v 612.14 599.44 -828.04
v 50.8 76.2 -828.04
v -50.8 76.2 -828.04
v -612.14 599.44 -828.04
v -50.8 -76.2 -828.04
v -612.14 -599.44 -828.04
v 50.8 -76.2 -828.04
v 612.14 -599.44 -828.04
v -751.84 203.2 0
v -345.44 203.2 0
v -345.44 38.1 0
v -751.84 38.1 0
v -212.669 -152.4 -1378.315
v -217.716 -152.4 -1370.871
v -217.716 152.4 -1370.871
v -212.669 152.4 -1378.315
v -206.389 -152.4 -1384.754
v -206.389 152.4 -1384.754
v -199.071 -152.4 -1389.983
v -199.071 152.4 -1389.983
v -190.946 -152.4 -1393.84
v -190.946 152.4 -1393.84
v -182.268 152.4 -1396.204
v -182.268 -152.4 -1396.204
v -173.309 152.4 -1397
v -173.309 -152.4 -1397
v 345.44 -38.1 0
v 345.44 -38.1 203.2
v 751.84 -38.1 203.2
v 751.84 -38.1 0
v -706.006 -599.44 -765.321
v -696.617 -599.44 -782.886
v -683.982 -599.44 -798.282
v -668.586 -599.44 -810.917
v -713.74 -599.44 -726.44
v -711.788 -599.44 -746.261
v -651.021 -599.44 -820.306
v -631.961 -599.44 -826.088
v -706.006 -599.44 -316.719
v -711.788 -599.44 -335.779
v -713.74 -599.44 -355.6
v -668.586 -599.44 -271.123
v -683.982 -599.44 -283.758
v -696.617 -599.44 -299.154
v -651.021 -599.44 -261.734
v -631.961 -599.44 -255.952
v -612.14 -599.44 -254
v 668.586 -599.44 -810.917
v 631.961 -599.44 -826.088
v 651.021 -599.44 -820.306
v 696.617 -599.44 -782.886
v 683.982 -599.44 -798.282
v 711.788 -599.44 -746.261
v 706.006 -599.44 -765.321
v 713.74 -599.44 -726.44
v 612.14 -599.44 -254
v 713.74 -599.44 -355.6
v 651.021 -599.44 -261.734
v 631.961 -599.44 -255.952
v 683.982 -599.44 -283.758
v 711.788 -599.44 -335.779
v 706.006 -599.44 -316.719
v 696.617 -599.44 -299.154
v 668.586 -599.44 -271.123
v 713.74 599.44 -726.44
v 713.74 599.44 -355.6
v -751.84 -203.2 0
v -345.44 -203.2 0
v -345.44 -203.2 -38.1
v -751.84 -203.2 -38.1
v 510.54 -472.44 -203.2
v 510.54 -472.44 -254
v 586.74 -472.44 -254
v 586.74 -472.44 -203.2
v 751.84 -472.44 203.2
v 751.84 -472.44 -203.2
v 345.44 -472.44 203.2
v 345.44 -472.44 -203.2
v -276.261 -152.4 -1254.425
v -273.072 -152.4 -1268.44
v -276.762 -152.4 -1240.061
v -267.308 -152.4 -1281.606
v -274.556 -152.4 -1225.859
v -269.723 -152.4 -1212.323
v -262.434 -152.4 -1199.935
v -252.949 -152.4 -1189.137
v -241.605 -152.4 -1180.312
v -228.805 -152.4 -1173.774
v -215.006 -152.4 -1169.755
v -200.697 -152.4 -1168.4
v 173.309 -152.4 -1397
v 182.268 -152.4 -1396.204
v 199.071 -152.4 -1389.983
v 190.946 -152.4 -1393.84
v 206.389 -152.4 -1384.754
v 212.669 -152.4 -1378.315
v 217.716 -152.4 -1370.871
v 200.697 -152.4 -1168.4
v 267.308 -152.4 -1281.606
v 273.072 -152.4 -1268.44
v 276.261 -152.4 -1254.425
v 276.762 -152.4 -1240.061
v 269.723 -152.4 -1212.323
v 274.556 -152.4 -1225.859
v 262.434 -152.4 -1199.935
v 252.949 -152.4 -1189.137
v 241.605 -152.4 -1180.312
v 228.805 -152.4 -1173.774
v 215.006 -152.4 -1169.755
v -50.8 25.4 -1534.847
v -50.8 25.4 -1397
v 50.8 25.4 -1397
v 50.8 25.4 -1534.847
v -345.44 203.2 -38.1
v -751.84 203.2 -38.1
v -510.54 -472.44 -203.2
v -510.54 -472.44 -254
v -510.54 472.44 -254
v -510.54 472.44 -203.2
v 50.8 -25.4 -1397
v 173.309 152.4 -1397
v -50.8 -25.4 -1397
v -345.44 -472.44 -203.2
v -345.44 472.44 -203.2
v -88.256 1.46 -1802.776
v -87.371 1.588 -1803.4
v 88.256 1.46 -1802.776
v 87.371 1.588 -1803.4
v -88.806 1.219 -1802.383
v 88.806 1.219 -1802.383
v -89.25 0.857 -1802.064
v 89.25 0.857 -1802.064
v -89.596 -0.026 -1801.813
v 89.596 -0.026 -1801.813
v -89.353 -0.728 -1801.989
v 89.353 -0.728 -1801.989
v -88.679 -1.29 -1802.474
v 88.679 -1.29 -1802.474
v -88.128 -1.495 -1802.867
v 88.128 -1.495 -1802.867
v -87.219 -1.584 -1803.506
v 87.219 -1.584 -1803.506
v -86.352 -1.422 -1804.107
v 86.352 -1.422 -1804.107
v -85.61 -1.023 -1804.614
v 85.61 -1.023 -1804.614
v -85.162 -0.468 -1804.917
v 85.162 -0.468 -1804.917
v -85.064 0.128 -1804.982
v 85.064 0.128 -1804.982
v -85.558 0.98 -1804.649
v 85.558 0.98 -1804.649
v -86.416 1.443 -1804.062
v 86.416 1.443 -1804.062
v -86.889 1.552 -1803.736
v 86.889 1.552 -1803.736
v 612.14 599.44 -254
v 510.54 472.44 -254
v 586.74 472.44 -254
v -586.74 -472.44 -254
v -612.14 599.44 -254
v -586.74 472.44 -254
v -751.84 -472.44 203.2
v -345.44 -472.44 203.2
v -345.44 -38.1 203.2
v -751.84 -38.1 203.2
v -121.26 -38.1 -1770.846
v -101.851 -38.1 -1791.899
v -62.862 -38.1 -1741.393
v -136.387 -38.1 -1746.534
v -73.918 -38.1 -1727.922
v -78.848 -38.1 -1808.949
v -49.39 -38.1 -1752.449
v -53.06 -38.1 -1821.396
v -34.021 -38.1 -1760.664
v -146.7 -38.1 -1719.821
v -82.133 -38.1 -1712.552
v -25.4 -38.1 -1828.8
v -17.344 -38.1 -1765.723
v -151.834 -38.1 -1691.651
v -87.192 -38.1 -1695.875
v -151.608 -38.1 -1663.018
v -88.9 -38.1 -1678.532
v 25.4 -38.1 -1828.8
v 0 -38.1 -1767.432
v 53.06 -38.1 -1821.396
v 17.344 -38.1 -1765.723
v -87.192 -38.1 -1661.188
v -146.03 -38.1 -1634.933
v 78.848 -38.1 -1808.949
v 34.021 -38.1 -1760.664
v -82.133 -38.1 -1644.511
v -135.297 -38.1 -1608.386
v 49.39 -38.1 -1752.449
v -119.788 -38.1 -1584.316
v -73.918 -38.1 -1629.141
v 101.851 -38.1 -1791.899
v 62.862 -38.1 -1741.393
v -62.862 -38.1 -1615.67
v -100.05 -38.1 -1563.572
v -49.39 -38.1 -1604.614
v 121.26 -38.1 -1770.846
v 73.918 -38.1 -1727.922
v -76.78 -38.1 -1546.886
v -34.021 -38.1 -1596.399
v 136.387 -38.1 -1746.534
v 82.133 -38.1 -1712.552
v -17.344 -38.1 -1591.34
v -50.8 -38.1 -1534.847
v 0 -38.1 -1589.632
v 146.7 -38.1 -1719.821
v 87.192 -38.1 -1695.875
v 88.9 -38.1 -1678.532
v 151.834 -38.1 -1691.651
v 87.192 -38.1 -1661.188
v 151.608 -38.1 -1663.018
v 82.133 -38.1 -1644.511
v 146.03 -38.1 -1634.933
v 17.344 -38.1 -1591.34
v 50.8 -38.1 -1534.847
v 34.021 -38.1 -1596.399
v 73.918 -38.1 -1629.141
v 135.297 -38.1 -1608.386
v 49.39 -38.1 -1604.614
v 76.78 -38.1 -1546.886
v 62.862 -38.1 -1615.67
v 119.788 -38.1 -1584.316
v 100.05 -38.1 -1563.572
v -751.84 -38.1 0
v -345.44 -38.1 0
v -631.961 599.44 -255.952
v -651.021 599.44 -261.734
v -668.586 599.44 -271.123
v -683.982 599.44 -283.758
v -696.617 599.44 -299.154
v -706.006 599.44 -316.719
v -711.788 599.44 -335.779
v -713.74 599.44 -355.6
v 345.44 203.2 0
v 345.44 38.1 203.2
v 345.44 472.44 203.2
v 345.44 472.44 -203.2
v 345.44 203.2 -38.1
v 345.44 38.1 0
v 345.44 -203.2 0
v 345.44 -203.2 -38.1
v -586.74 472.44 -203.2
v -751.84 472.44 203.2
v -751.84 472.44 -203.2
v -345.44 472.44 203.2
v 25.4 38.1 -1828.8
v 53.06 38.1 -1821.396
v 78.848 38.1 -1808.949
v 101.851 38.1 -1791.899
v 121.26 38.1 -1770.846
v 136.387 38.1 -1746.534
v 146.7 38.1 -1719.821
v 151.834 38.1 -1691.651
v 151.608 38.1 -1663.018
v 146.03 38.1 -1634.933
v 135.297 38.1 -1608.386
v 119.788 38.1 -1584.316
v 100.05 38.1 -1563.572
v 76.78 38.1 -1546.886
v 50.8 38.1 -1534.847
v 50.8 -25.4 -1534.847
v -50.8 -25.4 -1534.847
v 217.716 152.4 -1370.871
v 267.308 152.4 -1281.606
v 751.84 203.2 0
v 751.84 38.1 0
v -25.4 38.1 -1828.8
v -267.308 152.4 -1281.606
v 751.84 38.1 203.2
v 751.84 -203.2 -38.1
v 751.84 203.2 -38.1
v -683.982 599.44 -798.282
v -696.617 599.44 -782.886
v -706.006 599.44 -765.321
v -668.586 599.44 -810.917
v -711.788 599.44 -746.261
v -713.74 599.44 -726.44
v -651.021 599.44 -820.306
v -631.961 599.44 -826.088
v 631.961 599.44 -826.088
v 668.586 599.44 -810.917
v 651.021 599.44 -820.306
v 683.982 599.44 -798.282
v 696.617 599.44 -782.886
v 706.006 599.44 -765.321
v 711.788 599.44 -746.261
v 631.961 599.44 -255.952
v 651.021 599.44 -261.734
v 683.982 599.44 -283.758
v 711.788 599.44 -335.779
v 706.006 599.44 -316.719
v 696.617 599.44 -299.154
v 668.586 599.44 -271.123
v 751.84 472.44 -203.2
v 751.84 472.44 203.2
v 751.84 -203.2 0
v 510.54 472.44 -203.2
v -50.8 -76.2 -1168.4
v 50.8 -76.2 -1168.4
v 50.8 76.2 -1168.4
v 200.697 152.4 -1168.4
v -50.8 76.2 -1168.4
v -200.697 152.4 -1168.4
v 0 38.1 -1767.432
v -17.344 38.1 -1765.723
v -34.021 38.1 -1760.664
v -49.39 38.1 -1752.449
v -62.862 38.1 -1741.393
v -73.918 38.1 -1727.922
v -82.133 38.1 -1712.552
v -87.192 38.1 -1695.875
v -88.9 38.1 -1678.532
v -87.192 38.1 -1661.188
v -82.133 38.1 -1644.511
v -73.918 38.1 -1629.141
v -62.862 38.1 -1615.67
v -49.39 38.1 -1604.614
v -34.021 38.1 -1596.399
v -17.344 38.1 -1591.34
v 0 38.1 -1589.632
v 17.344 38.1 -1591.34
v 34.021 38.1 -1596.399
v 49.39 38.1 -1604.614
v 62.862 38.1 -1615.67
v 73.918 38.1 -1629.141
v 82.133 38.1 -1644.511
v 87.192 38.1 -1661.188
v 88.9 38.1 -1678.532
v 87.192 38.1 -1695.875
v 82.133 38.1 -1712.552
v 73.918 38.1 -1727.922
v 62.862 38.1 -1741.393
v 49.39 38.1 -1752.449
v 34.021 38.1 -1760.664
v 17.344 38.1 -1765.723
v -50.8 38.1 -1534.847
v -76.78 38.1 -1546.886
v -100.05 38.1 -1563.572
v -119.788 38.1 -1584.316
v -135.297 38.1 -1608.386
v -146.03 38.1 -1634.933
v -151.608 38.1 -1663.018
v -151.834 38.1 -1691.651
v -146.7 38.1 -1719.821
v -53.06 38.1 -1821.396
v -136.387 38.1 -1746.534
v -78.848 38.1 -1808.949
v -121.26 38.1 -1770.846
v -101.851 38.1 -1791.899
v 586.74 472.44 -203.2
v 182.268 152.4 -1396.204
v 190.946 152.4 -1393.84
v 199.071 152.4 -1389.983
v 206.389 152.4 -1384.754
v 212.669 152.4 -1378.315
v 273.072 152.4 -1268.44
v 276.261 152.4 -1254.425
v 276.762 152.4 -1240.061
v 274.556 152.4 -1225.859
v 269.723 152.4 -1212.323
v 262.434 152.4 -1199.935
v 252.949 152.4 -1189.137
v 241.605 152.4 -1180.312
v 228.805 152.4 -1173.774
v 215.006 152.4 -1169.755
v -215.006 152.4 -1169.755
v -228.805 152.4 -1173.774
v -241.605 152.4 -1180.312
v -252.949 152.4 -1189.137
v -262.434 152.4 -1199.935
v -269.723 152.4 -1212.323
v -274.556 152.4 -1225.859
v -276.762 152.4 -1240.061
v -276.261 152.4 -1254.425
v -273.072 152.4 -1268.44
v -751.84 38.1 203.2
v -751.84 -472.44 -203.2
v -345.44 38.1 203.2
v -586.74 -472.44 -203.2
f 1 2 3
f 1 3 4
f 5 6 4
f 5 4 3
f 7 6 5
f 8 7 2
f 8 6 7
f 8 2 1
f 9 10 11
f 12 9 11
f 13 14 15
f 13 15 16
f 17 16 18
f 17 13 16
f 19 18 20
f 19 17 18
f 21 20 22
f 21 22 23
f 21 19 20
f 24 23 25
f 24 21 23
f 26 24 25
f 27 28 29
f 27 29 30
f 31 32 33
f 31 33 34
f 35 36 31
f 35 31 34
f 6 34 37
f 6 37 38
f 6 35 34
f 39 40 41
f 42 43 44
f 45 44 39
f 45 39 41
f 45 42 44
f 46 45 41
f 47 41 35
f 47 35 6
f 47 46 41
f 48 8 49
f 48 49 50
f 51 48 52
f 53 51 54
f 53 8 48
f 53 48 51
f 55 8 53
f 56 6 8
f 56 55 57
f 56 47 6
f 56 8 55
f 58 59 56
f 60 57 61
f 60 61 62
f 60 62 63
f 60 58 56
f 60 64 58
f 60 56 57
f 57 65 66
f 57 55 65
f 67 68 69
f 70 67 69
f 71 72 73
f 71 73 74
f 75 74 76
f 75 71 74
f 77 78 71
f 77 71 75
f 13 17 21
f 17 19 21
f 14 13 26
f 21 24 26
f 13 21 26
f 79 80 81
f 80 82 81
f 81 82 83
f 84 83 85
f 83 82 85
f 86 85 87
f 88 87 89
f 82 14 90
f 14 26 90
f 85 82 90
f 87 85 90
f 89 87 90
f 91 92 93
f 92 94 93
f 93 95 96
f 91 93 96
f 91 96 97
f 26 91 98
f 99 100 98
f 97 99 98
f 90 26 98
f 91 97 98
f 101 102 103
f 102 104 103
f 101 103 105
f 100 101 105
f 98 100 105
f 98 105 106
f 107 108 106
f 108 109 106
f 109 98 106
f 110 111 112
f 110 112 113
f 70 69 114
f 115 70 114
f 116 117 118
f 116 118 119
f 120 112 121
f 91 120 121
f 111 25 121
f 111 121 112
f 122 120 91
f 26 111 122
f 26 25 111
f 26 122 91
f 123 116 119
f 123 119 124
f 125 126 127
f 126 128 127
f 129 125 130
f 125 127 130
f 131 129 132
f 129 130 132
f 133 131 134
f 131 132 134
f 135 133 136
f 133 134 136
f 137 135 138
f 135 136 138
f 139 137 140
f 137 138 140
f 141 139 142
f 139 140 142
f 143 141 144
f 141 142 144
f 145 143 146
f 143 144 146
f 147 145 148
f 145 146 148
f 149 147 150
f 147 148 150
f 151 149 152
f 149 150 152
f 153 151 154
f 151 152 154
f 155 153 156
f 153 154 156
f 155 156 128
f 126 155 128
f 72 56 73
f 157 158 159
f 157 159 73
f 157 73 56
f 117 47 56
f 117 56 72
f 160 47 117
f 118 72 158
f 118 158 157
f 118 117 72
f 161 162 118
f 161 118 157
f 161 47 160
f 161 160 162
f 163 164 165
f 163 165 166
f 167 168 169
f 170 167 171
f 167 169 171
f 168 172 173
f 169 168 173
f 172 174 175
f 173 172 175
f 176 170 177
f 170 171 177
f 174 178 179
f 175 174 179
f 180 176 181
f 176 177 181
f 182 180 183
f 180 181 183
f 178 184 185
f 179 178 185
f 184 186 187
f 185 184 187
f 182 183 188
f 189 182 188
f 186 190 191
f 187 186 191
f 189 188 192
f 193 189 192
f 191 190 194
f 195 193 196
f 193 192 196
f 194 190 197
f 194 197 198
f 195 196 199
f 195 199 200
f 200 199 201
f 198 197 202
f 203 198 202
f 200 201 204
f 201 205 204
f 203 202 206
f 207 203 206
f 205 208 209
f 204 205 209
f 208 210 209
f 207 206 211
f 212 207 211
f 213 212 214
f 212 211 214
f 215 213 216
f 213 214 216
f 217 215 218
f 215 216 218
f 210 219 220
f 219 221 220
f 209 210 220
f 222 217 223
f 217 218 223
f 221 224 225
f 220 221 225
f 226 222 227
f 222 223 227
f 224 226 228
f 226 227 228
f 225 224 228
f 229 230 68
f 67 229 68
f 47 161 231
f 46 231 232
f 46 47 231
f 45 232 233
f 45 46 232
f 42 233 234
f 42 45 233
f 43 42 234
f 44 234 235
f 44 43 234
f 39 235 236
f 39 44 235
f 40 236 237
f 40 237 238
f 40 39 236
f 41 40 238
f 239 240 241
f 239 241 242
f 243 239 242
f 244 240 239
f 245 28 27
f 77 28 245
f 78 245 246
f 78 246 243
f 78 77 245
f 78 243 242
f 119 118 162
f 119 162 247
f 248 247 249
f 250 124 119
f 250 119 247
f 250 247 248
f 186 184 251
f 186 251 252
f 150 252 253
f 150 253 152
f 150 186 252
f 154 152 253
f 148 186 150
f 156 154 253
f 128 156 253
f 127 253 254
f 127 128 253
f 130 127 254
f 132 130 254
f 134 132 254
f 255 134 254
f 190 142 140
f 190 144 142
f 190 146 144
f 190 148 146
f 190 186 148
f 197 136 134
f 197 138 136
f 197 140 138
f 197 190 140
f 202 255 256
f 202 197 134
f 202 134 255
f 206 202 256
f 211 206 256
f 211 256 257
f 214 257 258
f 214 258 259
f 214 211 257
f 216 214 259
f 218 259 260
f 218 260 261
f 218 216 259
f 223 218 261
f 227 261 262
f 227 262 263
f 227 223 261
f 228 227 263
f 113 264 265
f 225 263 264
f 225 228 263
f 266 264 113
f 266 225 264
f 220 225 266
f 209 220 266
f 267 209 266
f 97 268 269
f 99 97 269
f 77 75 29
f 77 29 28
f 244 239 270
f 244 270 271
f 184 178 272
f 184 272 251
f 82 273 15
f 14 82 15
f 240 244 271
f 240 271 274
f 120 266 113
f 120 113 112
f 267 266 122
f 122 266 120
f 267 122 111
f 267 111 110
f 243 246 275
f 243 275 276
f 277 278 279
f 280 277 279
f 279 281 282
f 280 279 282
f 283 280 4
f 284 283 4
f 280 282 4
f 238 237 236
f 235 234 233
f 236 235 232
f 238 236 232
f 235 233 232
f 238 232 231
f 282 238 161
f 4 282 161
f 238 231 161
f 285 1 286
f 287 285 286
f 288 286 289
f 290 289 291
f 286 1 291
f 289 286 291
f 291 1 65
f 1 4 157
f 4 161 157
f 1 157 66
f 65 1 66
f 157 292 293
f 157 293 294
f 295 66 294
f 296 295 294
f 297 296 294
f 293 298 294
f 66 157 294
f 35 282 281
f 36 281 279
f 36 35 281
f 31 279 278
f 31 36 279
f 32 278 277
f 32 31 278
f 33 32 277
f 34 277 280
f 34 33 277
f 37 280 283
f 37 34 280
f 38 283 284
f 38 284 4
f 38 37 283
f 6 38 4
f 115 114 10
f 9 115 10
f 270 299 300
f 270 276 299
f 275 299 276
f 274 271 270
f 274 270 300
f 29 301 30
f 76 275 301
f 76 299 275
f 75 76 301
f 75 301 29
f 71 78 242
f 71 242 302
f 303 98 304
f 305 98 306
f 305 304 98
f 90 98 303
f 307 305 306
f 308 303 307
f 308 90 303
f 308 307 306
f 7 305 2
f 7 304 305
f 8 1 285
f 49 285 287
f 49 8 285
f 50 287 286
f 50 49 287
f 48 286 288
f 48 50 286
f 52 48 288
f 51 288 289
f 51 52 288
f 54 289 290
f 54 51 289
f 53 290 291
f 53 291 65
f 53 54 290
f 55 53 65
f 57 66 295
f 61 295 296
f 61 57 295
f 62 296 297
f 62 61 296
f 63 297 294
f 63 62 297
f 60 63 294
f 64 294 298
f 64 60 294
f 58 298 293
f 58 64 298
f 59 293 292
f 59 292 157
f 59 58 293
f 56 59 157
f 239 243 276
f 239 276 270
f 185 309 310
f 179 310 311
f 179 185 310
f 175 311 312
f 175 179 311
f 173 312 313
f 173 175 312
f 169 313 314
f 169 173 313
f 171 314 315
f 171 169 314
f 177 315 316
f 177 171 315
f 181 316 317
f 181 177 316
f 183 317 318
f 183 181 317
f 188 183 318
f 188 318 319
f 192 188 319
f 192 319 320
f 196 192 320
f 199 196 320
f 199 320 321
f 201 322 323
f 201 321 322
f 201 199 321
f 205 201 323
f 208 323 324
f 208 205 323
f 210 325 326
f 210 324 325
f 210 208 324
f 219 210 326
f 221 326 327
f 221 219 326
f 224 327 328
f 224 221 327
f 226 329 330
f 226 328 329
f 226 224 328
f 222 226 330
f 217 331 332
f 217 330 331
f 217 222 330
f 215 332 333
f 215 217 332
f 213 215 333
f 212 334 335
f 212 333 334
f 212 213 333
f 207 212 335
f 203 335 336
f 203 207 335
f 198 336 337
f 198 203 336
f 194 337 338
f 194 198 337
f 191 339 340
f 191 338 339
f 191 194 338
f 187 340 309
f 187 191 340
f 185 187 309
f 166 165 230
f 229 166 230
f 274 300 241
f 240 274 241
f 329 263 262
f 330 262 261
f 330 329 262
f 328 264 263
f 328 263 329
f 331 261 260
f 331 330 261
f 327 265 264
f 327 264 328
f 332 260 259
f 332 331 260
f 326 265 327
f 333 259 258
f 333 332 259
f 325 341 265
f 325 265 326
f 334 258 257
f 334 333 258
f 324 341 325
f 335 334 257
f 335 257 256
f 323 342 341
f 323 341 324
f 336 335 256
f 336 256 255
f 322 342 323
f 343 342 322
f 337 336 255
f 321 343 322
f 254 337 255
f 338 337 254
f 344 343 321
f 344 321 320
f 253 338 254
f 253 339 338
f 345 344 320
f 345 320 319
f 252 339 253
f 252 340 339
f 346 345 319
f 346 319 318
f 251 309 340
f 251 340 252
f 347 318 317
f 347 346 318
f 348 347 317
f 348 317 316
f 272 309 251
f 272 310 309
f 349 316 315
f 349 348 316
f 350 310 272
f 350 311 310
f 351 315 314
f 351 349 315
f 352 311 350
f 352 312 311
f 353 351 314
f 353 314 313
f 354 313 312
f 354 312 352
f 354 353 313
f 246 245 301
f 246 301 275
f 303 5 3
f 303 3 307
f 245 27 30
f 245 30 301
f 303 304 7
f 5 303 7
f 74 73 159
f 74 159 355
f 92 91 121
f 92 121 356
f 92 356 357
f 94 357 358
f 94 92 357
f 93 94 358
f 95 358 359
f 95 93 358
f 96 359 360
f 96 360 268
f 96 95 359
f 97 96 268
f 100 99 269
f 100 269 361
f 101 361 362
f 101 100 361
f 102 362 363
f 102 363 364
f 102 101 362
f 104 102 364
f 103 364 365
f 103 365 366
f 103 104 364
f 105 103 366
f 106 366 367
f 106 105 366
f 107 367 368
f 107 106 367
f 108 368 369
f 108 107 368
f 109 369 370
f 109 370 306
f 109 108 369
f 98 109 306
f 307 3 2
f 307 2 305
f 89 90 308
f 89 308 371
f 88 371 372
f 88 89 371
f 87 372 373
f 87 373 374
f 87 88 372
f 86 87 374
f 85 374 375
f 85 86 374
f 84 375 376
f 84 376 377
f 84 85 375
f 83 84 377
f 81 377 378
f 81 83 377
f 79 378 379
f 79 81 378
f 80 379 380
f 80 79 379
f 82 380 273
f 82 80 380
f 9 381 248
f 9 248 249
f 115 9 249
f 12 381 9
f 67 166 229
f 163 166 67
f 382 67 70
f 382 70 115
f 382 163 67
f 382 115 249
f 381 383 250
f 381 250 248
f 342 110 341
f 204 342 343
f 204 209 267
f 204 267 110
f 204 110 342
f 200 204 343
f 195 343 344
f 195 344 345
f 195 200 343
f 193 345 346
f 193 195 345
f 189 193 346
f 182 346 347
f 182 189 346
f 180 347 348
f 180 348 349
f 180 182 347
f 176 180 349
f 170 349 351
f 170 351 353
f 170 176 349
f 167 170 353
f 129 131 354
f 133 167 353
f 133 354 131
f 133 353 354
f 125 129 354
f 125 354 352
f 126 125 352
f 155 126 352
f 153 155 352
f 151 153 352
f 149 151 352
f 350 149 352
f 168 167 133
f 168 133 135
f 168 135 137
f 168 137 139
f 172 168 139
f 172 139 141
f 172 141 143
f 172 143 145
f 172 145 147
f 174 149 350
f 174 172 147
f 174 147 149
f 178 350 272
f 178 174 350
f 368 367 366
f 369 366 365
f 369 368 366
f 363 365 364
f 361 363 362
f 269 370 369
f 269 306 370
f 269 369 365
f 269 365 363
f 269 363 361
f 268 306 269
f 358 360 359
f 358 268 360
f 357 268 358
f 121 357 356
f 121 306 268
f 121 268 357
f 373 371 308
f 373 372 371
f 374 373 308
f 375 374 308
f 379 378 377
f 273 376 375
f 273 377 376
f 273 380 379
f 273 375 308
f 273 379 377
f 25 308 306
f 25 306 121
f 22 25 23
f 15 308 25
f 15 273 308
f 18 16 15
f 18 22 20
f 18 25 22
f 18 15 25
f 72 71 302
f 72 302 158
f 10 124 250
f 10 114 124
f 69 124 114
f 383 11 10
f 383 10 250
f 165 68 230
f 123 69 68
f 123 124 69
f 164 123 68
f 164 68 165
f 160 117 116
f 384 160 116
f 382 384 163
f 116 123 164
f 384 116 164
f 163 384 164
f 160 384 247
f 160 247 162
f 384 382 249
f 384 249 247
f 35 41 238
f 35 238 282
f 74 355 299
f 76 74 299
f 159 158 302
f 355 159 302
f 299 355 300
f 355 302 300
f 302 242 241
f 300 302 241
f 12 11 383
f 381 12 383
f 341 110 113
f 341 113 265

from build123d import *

# Parameters (mm, degrees)
F1_DEPTH      = 599.44
F2_W          = 127
F2_H          = 457.2
F2_R          = 1.5875
F3_DEPTH      = 751.841
F3_DEPTH_BACK = 751.841


with BuildPart() as f1:
    # F0 (on Front) → F1 (new body, symmetric)
    with BuildSketch(Plane.XZ):
        with BuildLine():
            Line((751.84, 203.2), (345.44, 203.2))
            Line((345.44, 203.2), (345.44, -203.2))
            Line((345.44, -203.2), (510.54, -203.2))
            Line((510.54, -203.2), (510.54, -254))
            Line((510.54, -254), (0, -254))
            Line((0, -254), (-510.54, -254))
            Line((-510.54, -254), (-510.54, -203.2))
            Line((-510.54, -203.2), (-345.44, -203.2))
            Line((-345.44, -203.2), (-345.44, 203.2))
            Line((-345.44, 203.2), (-751.84, 203.2))
            Line((-751.84, 203.2), (-751.84, -203.2))
            Line((-751.84, -203.2), (-586.74, -203.2))
            Line((-586.74, -203.2), (-586.74, -254))
            Line((-586.74, -254), (-612.14, -254))
            ThreePointArc((-612.14, -254), (-683.9820489686, -283.7579510314), (-713.74, -355.6))
            Line((-713.74, -355.6), (-713.74, -726.44))
            ThreePointArc((-713.74, -726.44), (-683.9820489686, -798.2820489686), (-612.14, -828.04))
            Line((-612.14, -828.04), (-50.8, -828.04))
            Line((-50.8, -828.04), (-50.8, -1168.4))
            Line((-50.8, -1168.4), (-200.6969981396, -1168.4))
            ThreePointArc((-200.6969981396, -1168.4), (-266.3715614854, -1205.9568669833), (-267.3077825801, -1281.6059913558))
            Line((-267.3077825801, -1281.6059913558), (-217.7162994978, -1370.8706609039))
            ThreePointArc((-217.7162994978, -1370.8706609039), (-199.0711985486, -1389.9830422305), (-173.3091098709, -1397))
            Line((-173.3091098709, -1397), (-50.8, -1397))
            Line((-50.8, -1397), (-50.8, -1534.8474755722))
            ThreePointArc((-50.8, -1534.8474755722), (-151.8342242526, -1691.6513427765), (-25.4, -1828.8))
            Line((-25.4, -1828.8), (25.4, -1828.8))
            ThreePointArc((25.4, -1828.8), (151.8342242526, -1691.6513427765), (50.8, -1534.8474755722))
            Line((50.8, -1534.8474755722), (50.8, -1397))
            Line((50.8, -1397), (173.3091098709, -1397))
            ThreePointArc((173.3091098709, -1397), (199.0711985486, -1389.9830422305), (217.7162994978, -1370.8706609039))
            Line((217.7162994978, -1370.8706609039), (267.3077825801, -1281.6059913558))
            ThreePointArc((267.3077825801, -1281.6059913558), (266.3715614854, -1205.9568669833), (200.6969981396, -1168.4))
            Line((200.6969981396, -1168.4), (50.8, -1168.4))
            Line((50.8, -1168.4), (50.8, -828.04))
            Line((50.8, -828.04), (612.14, -828.04))
            ThreePointArc((612.14, -828.04), (683.9820489686, -798.2820489686), (713.74, -726.44))
            Line((713.74, -726.44), (713.74, -355.6))
            ThreePointArc((713.74, -355.6), (683.9820489686, -283.7579510314), (612.14, -254))
            Line((612.14, -254), (586.74, -254))
            Line((586.74, -254), (586.74, -203.2))
            Line((586.74, -203.2), (751.84, -203.2))
            Line((751.84, -203.2), (751.84, 203.2))
        make_face()
        with BuildLine():
            ThreePointArc((0, -1589.6315735093), (88.9, -1678.5315735093), (0, -1767.4315735093))
            ThreePointArc((0, -1767.4315735093), (-88.9, -1678.5315735093), (0, -1589.6315735093))
        make_face(mode=Mode.SUBTRACT)
    extrude(amount=F1_DEPTH, both=True)

    # F2 (on Right) → F3 (cut, two sides)
    with BuildSketch(Plane.YZ) as f3_sk:
        with Locations((535.94, -25.4)):
            Rectangle(F2_W, F2_H)
        Polygon((599.44, -1828.8), (599.44, -828.04), (152.4, -828.04), (76.2, -828.04), (76.2, -1168.4), (152.4, -1168.4), (152.4, -1397), (25.4, -1397), (25.4, -1534.8474755722), (38.1, -1534.8474755722), (38.1, -1828.8), align=None)
        Polygon((203.2, 0), (38.1, 0), (38.1, 203.2), (0, 203.2), (-38.1, 203.2), (-38.1, 0), (-203.2, 0), (-203.2, -38.1), (0, -38.1), (203.2, -38.1), align=None)
        Polygon((-76.2, -828.04), (-152.4, -828.04), (-599.44, -828.04), (-599.44, -1828.8), (-38.1, -1828.8), (-38.1, -1534.8474755722), (-25.4, -1534.8474755722), (-25.4, -1397), (-152.4, -1397), (-152.4, -1168.4), (-76.2, -1168.4), align=None)
        with Locations((-535.94, -25.4)):
            Rectangle(F2_W, F2_H)
        with Locations((0, -1803.4)):
            Circle(F2_R)
    extrude(amount=-F3_DEPTH, mode=Mode.SUBTRACT)
    extrude(f3_sk.sketch, amount=F3_DEPTH_BACK, mode=Mode.SUBTRACT)


solid = f1.part
